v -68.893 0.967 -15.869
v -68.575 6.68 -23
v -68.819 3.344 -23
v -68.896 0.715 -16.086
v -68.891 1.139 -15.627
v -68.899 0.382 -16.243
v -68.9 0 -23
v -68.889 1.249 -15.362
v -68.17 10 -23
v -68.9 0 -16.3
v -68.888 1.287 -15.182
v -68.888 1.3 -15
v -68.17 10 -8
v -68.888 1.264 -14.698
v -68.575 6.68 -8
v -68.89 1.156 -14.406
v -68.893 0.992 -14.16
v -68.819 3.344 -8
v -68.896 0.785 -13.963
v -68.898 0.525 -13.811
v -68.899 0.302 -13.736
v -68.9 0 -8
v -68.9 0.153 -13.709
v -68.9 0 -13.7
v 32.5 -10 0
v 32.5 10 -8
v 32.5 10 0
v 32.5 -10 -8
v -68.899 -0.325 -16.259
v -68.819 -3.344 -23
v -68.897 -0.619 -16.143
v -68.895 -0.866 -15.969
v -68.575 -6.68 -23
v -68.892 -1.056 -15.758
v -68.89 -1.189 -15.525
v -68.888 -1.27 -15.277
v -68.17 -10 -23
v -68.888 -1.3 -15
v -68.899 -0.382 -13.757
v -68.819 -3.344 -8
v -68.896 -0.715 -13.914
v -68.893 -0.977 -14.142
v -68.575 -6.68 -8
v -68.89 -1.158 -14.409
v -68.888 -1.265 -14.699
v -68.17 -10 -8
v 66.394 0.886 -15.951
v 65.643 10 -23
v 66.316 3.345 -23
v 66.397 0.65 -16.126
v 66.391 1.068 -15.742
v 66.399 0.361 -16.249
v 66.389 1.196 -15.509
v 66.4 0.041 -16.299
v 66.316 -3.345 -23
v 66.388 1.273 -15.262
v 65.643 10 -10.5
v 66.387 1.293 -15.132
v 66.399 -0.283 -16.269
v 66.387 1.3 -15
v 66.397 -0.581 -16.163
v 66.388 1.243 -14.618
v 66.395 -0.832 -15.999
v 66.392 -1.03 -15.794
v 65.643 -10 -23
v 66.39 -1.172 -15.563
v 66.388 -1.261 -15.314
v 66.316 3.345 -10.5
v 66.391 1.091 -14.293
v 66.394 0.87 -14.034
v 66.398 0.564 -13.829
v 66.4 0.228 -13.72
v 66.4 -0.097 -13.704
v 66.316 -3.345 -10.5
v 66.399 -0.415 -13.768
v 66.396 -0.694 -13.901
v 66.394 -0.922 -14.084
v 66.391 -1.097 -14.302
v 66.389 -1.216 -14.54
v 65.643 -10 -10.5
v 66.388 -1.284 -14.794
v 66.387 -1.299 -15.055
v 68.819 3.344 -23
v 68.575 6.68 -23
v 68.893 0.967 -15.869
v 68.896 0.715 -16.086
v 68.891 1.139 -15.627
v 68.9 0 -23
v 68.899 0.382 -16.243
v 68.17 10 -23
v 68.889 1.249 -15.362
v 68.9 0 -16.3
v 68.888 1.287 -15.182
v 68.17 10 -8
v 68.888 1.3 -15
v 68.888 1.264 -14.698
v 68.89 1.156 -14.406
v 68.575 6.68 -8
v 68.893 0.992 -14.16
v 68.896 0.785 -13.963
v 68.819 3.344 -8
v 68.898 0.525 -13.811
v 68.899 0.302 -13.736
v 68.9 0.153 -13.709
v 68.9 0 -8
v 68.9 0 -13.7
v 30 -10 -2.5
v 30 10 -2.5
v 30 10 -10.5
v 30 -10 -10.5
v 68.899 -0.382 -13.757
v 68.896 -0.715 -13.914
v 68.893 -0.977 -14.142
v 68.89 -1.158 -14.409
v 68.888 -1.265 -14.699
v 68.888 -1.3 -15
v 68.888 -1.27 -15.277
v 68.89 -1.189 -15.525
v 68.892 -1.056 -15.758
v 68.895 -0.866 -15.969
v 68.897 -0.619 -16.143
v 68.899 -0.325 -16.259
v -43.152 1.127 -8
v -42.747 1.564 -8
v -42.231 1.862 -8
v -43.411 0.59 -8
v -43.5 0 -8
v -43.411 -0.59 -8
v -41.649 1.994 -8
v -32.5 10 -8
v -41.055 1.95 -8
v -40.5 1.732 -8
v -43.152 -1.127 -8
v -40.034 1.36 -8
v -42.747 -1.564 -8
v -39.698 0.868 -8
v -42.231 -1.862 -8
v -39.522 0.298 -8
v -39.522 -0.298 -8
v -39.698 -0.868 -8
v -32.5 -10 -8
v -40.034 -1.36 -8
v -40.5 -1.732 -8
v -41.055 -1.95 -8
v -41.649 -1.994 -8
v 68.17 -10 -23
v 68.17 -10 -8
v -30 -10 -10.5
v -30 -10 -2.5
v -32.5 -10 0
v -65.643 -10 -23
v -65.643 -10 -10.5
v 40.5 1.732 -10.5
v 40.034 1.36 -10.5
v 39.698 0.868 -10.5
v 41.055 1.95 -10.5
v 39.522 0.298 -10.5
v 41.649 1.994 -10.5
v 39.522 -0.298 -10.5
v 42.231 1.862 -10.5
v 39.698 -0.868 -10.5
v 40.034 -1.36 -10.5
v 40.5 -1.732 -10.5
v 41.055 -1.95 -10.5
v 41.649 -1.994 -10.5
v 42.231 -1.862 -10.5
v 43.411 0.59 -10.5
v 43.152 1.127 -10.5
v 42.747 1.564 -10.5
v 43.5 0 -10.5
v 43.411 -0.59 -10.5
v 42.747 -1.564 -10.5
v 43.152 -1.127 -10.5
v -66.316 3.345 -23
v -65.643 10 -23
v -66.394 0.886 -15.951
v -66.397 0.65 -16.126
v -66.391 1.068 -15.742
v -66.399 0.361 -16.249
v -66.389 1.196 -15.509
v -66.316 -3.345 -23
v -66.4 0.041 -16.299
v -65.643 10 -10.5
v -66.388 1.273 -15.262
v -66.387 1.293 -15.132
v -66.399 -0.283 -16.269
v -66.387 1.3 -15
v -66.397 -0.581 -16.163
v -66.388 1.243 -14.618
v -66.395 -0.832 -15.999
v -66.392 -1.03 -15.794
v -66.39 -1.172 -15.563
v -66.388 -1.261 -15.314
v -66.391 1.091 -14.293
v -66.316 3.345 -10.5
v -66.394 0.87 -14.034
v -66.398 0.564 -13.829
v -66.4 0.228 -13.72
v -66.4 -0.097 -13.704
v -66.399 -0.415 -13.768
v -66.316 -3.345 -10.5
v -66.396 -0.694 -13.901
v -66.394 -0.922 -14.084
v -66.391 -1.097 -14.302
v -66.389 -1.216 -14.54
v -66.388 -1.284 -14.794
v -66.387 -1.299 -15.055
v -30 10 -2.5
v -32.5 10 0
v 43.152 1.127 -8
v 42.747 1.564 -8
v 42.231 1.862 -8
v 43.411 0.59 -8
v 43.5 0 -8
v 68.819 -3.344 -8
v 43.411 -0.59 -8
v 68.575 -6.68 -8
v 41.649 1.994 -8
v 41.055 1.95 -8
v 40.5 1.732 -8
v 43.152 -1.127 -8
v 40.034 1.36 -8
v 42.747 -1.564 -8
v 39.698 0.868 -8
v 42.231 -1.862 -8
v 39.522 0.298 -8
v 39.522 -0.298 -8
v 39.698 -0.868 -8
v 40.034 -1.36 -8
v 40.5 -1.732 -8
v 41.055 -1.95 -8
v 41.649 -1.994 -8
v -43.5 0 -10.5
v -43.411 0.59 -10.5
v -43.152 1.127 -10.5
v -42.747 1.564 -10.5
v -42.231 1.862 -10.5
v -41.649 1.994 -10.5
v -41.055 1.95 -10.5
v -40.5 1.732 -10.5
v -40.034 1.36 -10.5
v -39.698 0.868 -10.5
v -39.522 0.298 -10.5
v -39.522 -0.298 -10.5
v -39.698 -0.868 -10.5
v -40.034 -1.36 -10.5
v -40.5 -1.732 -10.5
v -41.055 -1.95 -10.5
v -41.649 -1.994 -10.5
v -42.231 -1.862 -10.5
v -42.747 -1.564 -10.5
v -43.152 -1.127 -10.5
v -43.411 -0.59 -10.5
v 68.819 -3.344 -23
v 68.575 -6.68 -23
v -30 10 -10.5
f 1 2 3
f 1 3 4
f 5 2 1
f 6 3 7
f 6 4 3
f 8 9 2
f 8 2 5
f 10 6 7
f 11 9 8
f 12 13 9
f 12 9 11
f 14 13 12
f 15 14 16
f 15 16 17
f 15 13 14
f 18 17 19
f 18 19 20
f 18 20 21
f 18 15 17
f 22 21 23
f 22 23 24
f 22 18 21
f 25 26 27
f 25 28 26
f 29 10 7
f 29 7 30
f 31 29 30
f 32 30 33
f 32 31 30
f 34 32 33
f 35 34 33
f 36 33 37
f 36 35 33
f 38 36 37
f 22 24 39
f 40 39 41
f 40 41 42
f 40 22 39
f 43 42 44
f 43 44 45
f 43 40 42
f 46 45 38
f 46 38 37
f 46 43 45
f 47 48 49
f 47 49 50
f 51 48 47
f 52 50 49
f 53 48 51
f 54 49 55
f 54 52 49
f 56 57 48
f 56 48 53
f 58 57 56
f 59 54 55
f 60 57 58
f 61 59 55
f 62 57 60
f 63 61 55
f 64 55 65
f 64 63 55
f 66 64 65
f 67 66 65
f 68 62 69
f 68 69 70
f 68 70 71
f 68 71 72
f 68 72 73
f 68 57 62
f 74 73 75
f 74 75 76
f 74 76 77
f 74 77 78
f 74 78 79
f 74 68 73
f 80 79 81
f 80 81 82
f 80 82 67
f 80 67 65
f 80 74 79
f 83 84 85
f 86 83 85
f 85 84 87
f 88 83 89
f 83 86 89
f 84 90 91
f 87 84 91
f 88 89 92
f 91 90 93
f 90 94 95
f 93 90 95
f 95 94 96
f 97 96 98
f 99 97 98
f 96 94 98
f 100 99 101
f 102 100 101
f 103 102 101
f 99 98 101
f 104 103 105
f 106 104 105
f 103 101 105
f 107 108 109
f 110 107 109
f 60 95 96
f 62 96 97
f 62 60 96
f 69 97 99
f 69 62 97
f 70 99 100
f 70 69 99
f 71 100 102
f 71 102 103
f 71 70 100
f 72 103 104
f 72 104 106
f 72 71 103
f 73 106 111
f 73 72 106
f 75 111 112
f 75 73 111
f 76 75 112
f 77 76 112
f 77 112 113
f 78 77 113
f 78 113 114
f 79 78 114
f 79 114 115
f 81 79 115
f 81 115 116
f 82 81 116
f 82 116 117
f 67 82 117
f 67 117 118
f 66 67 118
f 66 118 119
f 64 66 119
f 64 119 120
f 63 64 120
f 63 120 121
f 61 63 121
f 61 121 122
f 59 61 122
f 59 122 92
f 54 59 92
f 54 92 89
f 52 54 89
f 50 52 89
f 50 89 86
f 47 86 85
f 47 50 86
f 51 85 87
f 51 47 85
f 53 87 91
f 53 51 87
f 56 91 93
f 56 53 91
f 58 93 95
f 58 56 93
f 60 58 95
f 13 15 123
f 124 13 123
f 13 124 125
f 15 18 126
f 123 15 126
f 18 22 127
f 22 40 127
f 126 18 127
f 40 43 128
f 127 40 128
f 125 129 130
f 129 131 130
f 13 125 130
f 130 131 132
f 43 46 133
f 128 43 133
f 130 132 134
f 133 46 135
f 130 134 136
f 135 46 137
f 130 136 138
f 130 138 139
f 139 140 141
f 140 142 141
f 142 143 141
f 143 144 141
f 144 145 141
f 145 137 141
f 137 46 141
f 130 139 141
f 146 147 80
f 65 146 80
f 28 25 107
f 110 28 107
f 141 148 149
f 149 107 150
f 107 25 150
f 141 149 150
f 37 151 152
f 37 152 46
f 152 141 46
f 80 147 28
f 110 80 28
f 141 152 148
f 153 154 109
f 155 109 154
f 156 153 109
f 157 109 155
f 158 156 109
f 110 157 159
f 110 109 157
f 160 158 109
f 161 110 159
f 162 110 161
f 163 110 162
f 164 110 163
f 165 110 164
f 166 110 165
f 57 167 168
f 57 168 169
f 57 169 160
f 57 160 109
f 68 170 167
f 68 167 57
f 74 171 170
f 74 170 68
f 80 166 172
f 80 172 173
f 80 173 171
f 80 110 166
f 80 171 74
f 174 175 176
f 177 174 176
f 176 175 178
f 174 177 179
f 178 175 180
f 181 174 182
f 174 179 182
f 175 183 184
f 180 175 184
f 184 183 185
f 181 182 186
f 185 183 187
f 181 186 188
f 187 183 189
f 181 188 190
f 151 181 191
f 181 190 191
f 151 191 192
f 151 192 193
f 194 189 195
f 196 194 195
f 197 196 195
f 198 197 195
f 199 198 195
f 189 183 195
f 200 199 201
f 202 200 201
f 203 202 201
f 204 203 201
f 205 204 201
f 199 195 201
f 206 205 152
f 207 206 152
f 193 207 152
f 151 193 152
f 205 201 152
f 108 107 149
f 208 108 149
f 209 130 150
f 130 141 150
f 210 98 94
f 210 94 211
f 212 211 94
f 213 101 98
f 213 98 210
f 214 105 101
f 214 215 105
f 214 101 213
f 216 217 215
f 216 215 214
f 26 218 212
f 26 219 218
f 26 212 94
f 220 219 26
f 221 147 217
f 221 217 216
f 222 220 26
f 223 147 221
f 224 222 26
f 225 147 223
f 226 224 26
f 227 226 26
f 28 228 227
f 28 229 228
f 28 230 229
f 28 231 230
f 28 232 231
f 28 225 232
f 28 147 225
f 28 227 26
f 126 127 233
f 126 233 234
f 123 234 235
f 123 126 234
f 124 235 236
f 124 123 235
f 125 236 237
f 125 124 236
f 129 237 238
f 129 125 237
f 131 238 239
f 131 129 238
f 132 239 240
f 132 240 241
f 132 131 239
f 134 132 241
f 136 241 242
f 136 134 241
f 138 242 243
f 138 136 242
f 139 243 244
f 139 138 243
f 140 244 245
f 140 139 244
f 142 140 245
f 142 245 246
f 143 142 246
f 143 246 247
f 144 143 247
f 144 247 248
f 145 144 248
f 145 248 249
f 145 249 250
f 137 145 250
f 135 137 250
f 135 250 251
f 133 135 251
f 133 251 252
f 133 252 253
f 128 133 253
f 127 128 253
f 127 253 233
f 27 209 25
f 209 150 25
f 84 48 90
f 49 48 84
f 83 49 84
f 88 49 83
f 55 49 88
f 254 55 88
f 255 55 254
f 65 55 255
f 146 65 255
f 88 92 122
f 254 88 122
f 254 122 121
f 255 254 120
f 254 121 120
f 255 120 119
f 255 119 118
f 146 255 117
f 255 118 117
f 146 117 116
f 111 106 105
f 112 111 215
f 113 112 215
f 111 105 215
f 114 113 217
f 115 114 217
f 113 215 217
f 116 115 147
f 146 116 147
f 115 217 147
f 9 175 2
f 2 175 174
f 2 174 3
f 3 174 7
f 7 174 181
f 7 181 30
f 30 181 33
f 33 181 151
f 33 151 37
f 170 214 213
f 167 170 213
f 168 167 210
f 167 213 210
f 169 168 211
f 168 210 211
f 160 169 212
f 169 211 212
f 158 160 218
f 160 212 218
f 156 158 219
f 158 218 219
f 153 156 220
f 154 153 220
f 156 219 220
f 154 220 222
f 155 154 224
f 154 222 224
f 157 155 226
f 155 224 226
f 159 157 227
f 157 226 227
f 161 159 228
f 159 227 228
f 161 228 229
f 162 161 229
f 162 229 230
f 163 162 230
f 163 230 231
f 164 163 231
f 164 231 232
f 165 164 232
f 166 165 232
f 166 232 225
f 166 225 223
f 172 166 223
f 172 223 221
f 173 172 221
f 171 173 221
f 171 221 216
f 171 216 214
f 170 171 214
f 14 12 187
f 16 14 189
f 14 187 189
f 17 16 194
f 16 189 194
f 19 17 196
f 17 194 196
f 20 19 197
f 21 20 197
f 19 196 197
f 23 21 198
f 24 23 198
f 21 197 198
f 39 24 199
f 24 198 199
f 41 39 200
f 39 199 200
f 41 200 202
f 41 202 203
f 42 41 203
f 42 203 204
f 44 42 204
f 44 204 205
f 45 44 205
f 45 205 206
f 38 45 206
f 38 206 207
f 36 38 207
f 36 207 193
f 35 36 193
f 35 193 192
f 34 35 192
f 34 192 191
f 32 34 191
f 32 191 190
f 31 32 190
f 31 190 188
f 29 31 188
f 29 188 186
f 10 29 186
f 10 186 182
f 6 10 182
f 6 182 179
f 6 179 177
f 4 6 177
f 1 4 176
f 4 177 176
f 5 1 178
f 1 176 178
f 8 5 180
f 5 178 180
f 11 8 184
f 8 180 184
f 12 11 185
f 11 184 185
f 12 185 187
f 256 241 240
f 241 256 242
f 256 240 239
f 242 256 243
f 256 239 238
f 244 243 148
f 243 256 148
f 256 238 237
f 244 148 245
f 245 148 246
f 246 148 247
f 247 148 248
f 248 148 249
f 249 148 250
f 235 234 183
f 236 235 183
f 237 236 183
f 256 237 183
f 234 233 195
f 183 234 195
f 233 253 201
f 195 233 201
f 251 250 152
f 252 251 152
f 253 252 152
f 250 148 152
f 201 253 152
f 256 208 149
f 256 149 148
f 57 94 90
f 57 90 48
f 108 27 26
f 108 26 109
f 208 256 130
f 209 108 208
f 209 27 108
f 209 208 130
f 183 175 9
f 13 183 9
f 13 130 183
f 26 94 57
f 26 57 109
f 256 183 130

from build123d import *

# Parameters (mm, degrees)
F1_DEPTH = 10
F2_R     = 2
F3_DEPTH = 23.001
F5_DEPTH = 15.001
F6_DEPTH = 15
F7_R     = 1.3
F8_DEPTH = 68.901


with BuildPart() as f1:
    # F0 (on Front) → F1 (new body, symmetric)
    with BuildSketch(Plane.XZ):
        Polygon((32.5, 0), (0, 0), (0, -2.5), (30, -2.5), (30, -10.5), (66.4, -10.5), (66.4, -23), (68.9, -23), (68.9, -8), (32.5, -8), align=None)
    extrude(amount=F1_DEPTH, both=True)

    # F2 (on Top) → F3 (cut, through all)
    with BuildSketch(Plane.XY):
        with Locations((41.5, 0)):
            Circle(F2_R)
    extrude(amount=-F3_DEPTH, mode=Mode.SUBTRACT)

    # F4 (on face) → F5 (cut, through all)
    with BuildSketch(Plane.XY.offset(-8)):
        Polygon((70.9, 10), (68.9, 10), (68.9, 0), (68.9, -10), (70.9, -10), align=None)
        with BuildLine():
            Line((68.9, -10), (68.9, 0))
            ThreePointArc((68.9, 0), (68.71737, -5.013288), (68.170448, -10))
            Line((68.170448, -10), (68.9, -10))
        make_face()
        with BuildLine():
            Line((68.9, 10), (68.170448, 10))
            ThreePointArc((68.170448, 10), (68.71737, 5.013288), (68.9, 0))
            Line((68.9, 0), (68.9, 10))
        make_face()
    extrude(amount=-F5_DEPTH, mode=Mode.SUBTRACT)

    # F4 (on face) → F6 (join, through all)
    with BuildSketch(Plane.XY.offset(-8)):
        with BuildLine():
            Line((68.170448, 10), (65.642669, 10))
            ThreePointArc((65.642669, 10), (66.4, 0), (65.642669, -10))
            Line((65.642669, -10), (68.170448, -10))
            ThreePointArc((68.170448, -10), (68.71737, -5.013288), (68.9, 0))
            ThreePointArc((68.9, 0), (68.71737, 5.013288), (68.170448, 10))
        make_face()
    extrude(amount=-F6_DEPTH)

    # F7 (on Right) → F8 (cut, through all)
    with BuildSketch(Plane.YZ):
        with Locations((0, -15)):
            Circle(F7_R)
    extrude(amount=F8_DEPTH, mode=Mode.SUBTRACT)

    # F9: F1 across plane


with BuildPart() as f1_1:
    add(f1.part)
    add(f1.part.mirror(Plane.YZ))


solid = f1_1.part
